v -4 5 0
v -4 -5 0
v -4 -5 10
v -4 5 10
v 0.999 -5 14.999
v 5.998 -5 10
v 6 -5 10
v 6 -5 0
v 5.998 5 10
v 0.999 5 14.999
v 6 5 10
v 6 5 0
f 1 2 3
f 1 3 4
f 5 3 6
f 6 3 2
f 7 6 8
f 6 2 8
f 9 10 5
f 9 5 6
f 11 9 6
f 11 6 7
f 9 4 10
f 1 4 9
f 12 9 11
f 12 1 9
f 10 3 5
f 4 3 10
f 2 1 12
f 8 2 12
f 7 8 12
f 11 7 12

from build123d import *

# Parameters (mm, degrees)
BOX001_W            = 10
BOX001_H            = 10
BOX001_DEPTH        = 10
BOX_W               = 7.07
BOX_H               = 10
BOX_DEPTH           = 7.07
BOX_PLACEMENT_ANGLE = 45


with BuildPart() as cubo_base:
    # Box001 → Box001 (new body)
    with BuildSketch(Plane(origin=(-4, -5, 0), x_dir=(1, 0, 0), z_dir=(0, 0, 1))):
        with Locations((5, 5)):
            Rectangle(BOX001_W, BOX001_H)
    extrude(amount=BOX001_DEPTH)


with BuildPart() as fusion:
    # Box → Box (new body)
    with BuildSketch(Plane.XY):
        with Locations((3.535, 5)):
            Rectangle(BOX_W, BOX_H)
    extrude(amount=BOX_DEPTH)


with BuildPart() as fusion_1:
    # Box placement: moved
    add(fusion.part.moved(Location((-4, -5, 10))).rotate(Axis((-4, -5, 10), (0, 1, 0)), BOX_PLACEMENT_ANGLE))

    # Fusion: union cubo_base
    add(cubo_base.part)


solid = fusion_1.part
